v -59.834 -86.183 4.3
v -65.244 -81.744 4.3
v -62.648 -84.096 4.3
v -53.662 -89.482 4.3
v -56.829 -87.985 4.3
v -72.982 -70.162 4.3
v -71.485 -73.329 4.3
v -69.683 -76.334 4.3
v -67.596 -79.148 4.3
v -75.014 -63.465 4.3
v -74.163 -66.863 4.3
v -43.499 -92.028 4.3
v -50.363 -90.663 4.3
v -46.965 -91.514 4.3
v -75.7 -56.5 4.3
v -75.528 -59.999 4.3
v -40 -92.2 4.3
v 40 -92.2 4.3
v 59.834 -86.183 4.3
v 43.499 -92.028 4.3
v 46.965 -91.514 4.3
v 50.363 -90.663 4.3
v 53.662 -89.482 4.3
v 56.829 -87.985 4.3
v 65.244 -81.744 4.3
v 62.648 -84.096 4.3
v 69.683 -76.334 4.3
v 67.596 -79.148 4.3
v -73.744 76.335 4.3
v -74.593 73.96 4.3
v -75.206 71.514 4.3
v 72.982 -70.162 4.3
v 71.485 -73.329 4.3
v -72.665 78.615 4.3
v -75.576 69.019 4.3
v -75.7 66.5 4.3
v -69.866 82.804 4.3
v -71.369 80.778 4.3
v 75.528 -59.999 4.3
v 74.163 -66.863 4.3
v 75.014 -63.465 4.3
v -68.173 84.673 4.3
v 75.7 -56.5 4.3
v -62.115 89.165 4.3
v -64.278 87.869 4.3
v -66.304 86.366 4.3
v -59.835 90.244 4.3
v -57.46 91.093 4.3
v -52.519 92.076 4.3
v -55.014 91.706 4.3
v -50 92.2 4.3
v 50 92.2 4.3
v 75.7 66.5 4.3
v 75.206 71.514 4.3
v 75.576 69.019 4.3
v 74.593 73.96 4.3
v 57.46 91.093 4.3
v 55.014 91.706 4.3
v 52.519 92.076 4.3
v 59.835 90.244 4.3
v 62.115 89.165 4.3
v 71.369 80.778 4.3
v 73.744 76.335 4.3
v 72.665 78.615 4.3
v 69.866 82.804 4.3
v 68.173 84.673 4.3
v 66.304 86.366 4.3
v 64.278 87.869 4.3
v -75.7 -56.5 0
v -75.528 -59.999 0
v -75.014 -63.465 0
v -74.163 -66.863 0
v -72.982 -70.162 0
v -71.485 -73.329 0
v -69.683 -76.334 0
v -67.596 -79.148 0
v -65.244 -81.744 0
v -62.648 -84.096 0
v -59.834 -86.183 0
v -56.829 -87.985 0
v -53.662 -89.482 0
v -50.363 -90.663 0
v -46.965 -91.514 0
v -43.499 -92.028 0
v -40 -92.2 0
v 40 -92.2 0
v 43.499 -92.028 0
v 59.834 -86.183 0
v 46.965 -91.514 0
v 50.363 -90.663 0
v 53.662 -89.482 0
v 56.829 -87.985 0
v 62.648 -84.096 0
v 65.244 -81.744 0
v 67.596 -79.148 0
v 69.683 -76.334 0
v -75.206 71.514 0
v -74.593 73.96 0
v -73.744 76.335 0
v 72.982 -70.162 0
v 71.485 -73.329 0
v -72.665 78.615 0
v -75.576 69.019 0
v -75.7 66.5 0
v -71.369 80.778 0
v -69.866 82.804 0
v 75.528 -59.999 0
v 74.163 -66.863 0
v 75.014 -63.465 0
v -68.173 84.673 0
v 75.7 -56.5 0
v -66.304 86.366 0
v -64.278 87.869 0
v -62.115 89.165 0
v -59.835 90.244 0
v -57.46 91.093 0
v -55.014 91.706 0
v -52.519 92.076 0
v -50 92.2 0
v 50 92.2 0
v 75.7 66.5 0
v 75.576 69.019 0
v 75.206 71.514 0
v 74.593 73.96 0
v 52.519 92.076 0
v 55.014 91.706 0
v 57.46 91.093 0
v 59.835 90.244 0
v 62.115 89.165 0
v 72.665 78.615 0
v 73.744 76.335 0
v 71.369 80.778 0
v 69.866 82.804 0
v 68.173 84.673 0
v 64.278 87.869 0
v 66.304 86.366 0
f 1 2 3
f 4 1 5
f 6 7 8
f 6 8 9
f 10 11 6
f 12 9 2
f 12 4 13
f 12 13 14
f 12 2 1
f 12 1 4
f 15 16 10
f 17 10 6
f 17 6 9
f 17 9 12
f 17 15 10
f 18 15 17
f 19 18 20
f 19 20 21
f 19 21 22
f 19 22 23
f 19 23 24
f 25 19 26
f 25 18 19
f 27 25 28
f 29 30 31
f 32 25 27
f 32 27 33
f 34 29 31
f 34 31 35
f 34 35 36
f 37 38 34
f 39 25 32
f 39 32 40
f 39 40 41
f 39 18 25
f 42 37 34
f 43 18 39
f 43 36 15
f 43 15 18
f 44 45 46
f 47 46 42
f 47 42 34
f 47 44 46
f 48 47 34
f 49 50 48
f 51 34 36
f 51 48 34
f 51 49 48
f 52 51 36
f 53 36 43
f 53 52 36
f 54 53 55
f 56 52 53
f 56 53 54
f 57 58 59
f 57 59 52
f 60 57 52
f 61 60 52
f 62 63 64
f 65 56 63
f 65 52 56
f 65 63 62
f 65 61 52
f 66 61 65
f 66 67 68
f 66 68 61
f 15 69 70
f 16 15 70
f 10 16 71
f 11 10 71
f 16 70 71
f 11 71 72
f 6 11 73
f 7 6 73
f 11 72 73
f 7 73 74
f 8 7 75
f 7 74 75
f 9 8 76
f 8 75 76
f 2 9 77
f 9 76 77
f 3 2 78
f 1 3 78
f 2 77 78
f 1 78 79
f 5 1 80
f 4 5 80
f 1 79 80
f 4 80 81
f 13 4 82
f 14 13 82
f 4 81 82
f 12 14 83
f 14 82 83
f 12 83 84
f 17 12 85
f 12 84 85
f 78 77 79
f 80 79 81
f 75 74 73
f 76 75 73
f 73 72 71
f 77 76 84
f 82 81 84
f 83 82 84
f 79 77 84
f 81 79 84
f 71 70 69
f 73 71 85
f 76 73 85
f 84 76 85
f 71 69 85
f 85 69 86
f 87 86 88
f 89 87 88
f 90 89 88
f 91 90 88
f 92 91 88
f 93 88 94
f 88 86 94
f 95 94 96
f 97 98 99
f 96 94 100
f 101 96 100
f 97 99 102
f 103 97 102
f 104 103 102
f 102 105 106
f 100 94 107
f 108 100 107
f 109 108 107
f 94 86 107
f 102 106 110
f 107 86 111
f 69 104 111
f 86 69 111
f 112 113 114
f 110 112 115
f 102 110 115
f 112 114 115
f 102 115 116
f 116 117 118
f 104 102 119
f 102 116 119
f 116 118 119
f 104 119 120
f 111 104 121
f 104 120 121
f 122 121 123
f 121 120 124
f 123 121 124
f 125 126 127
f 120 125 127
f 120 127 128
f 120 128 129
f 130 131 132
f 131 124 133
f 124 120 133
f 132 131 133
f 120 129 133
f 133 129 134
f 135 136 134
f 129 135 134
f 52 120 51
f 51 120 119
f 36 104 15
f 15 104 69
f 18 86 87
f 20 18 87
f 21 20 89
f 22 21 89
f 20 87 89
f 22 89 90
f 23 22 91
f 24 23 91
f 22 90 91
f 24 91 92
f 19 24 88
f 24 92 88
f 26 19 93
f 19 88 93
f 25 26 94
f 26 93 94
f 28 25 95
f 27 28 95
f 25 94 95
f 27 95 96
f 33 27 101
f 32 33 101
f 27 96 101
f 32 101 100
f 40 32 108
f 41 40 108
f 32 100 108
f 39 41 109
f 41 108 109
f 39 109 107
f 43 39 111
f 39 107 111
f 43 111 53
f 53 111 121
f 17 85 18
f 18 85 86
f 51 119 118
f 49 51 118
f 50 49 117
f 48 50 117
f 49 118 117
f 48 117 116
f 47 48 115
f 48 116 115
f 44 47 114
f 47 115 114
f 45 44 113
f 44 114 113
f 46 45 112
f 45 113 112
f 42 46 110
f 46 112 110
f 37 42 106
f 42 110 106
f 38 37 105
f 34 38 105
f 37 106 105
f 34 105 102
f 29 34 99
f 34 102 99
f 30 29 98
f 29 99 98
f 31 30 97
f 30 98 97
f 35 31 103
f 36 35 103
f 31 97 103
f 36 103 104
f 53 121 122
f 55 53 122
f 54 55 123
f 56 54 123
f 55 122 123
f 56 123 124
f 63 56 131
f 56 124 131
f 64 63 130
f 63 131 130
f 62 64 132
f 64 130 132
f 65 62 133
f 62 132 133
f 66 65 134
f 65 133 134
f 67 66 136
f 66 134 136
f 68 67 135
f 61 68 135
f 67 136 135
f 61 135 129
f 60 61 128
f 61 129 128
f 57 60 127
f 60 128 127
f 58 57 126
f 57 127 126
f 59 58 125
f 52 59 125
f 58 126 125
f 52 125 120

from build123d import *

# Parameters (mm, degrees)
BOSS_EXTRUDE1_DEPTH = 4.3


with BuildPart() as part:
    # Sketch1 → Boss-Extrude1 (new body)
    with BuildSketch(Plane.XY):
        with BuildLine():
            Line((0.5, -92.2), (40, -92.2))
            ThreePointArc((40, -92.2), (65.243712088, -81.743712088), (75.7, -56.5))
            Line((75.7, -56.5), (75.7, 66.5))
            ThreePointArc((75.7, 66.5), (68.172644276, 84.672644276), (50, 92.2))
            Line((50, 92.2), (-50, 92.2))
            ThreePointArc((-50, 92.2), (-68.172644276, 84.672644276), (-75.7, 66.5))
            Line((-75.7, 66.5), (-75.7, -56.5))
            ThreePointArc((-75.7, -56.5), (-65.243712088, -81.743712088), (-40, -92.2))
            Line((-40, -92.2), (-0.5, -92.2))
            Line((-0.5, -92.2), (0.5, -92.2))
        make_face()
    extrude(amount=BOSS_EXTRUDE1_DEPTH)


solid = part.part
